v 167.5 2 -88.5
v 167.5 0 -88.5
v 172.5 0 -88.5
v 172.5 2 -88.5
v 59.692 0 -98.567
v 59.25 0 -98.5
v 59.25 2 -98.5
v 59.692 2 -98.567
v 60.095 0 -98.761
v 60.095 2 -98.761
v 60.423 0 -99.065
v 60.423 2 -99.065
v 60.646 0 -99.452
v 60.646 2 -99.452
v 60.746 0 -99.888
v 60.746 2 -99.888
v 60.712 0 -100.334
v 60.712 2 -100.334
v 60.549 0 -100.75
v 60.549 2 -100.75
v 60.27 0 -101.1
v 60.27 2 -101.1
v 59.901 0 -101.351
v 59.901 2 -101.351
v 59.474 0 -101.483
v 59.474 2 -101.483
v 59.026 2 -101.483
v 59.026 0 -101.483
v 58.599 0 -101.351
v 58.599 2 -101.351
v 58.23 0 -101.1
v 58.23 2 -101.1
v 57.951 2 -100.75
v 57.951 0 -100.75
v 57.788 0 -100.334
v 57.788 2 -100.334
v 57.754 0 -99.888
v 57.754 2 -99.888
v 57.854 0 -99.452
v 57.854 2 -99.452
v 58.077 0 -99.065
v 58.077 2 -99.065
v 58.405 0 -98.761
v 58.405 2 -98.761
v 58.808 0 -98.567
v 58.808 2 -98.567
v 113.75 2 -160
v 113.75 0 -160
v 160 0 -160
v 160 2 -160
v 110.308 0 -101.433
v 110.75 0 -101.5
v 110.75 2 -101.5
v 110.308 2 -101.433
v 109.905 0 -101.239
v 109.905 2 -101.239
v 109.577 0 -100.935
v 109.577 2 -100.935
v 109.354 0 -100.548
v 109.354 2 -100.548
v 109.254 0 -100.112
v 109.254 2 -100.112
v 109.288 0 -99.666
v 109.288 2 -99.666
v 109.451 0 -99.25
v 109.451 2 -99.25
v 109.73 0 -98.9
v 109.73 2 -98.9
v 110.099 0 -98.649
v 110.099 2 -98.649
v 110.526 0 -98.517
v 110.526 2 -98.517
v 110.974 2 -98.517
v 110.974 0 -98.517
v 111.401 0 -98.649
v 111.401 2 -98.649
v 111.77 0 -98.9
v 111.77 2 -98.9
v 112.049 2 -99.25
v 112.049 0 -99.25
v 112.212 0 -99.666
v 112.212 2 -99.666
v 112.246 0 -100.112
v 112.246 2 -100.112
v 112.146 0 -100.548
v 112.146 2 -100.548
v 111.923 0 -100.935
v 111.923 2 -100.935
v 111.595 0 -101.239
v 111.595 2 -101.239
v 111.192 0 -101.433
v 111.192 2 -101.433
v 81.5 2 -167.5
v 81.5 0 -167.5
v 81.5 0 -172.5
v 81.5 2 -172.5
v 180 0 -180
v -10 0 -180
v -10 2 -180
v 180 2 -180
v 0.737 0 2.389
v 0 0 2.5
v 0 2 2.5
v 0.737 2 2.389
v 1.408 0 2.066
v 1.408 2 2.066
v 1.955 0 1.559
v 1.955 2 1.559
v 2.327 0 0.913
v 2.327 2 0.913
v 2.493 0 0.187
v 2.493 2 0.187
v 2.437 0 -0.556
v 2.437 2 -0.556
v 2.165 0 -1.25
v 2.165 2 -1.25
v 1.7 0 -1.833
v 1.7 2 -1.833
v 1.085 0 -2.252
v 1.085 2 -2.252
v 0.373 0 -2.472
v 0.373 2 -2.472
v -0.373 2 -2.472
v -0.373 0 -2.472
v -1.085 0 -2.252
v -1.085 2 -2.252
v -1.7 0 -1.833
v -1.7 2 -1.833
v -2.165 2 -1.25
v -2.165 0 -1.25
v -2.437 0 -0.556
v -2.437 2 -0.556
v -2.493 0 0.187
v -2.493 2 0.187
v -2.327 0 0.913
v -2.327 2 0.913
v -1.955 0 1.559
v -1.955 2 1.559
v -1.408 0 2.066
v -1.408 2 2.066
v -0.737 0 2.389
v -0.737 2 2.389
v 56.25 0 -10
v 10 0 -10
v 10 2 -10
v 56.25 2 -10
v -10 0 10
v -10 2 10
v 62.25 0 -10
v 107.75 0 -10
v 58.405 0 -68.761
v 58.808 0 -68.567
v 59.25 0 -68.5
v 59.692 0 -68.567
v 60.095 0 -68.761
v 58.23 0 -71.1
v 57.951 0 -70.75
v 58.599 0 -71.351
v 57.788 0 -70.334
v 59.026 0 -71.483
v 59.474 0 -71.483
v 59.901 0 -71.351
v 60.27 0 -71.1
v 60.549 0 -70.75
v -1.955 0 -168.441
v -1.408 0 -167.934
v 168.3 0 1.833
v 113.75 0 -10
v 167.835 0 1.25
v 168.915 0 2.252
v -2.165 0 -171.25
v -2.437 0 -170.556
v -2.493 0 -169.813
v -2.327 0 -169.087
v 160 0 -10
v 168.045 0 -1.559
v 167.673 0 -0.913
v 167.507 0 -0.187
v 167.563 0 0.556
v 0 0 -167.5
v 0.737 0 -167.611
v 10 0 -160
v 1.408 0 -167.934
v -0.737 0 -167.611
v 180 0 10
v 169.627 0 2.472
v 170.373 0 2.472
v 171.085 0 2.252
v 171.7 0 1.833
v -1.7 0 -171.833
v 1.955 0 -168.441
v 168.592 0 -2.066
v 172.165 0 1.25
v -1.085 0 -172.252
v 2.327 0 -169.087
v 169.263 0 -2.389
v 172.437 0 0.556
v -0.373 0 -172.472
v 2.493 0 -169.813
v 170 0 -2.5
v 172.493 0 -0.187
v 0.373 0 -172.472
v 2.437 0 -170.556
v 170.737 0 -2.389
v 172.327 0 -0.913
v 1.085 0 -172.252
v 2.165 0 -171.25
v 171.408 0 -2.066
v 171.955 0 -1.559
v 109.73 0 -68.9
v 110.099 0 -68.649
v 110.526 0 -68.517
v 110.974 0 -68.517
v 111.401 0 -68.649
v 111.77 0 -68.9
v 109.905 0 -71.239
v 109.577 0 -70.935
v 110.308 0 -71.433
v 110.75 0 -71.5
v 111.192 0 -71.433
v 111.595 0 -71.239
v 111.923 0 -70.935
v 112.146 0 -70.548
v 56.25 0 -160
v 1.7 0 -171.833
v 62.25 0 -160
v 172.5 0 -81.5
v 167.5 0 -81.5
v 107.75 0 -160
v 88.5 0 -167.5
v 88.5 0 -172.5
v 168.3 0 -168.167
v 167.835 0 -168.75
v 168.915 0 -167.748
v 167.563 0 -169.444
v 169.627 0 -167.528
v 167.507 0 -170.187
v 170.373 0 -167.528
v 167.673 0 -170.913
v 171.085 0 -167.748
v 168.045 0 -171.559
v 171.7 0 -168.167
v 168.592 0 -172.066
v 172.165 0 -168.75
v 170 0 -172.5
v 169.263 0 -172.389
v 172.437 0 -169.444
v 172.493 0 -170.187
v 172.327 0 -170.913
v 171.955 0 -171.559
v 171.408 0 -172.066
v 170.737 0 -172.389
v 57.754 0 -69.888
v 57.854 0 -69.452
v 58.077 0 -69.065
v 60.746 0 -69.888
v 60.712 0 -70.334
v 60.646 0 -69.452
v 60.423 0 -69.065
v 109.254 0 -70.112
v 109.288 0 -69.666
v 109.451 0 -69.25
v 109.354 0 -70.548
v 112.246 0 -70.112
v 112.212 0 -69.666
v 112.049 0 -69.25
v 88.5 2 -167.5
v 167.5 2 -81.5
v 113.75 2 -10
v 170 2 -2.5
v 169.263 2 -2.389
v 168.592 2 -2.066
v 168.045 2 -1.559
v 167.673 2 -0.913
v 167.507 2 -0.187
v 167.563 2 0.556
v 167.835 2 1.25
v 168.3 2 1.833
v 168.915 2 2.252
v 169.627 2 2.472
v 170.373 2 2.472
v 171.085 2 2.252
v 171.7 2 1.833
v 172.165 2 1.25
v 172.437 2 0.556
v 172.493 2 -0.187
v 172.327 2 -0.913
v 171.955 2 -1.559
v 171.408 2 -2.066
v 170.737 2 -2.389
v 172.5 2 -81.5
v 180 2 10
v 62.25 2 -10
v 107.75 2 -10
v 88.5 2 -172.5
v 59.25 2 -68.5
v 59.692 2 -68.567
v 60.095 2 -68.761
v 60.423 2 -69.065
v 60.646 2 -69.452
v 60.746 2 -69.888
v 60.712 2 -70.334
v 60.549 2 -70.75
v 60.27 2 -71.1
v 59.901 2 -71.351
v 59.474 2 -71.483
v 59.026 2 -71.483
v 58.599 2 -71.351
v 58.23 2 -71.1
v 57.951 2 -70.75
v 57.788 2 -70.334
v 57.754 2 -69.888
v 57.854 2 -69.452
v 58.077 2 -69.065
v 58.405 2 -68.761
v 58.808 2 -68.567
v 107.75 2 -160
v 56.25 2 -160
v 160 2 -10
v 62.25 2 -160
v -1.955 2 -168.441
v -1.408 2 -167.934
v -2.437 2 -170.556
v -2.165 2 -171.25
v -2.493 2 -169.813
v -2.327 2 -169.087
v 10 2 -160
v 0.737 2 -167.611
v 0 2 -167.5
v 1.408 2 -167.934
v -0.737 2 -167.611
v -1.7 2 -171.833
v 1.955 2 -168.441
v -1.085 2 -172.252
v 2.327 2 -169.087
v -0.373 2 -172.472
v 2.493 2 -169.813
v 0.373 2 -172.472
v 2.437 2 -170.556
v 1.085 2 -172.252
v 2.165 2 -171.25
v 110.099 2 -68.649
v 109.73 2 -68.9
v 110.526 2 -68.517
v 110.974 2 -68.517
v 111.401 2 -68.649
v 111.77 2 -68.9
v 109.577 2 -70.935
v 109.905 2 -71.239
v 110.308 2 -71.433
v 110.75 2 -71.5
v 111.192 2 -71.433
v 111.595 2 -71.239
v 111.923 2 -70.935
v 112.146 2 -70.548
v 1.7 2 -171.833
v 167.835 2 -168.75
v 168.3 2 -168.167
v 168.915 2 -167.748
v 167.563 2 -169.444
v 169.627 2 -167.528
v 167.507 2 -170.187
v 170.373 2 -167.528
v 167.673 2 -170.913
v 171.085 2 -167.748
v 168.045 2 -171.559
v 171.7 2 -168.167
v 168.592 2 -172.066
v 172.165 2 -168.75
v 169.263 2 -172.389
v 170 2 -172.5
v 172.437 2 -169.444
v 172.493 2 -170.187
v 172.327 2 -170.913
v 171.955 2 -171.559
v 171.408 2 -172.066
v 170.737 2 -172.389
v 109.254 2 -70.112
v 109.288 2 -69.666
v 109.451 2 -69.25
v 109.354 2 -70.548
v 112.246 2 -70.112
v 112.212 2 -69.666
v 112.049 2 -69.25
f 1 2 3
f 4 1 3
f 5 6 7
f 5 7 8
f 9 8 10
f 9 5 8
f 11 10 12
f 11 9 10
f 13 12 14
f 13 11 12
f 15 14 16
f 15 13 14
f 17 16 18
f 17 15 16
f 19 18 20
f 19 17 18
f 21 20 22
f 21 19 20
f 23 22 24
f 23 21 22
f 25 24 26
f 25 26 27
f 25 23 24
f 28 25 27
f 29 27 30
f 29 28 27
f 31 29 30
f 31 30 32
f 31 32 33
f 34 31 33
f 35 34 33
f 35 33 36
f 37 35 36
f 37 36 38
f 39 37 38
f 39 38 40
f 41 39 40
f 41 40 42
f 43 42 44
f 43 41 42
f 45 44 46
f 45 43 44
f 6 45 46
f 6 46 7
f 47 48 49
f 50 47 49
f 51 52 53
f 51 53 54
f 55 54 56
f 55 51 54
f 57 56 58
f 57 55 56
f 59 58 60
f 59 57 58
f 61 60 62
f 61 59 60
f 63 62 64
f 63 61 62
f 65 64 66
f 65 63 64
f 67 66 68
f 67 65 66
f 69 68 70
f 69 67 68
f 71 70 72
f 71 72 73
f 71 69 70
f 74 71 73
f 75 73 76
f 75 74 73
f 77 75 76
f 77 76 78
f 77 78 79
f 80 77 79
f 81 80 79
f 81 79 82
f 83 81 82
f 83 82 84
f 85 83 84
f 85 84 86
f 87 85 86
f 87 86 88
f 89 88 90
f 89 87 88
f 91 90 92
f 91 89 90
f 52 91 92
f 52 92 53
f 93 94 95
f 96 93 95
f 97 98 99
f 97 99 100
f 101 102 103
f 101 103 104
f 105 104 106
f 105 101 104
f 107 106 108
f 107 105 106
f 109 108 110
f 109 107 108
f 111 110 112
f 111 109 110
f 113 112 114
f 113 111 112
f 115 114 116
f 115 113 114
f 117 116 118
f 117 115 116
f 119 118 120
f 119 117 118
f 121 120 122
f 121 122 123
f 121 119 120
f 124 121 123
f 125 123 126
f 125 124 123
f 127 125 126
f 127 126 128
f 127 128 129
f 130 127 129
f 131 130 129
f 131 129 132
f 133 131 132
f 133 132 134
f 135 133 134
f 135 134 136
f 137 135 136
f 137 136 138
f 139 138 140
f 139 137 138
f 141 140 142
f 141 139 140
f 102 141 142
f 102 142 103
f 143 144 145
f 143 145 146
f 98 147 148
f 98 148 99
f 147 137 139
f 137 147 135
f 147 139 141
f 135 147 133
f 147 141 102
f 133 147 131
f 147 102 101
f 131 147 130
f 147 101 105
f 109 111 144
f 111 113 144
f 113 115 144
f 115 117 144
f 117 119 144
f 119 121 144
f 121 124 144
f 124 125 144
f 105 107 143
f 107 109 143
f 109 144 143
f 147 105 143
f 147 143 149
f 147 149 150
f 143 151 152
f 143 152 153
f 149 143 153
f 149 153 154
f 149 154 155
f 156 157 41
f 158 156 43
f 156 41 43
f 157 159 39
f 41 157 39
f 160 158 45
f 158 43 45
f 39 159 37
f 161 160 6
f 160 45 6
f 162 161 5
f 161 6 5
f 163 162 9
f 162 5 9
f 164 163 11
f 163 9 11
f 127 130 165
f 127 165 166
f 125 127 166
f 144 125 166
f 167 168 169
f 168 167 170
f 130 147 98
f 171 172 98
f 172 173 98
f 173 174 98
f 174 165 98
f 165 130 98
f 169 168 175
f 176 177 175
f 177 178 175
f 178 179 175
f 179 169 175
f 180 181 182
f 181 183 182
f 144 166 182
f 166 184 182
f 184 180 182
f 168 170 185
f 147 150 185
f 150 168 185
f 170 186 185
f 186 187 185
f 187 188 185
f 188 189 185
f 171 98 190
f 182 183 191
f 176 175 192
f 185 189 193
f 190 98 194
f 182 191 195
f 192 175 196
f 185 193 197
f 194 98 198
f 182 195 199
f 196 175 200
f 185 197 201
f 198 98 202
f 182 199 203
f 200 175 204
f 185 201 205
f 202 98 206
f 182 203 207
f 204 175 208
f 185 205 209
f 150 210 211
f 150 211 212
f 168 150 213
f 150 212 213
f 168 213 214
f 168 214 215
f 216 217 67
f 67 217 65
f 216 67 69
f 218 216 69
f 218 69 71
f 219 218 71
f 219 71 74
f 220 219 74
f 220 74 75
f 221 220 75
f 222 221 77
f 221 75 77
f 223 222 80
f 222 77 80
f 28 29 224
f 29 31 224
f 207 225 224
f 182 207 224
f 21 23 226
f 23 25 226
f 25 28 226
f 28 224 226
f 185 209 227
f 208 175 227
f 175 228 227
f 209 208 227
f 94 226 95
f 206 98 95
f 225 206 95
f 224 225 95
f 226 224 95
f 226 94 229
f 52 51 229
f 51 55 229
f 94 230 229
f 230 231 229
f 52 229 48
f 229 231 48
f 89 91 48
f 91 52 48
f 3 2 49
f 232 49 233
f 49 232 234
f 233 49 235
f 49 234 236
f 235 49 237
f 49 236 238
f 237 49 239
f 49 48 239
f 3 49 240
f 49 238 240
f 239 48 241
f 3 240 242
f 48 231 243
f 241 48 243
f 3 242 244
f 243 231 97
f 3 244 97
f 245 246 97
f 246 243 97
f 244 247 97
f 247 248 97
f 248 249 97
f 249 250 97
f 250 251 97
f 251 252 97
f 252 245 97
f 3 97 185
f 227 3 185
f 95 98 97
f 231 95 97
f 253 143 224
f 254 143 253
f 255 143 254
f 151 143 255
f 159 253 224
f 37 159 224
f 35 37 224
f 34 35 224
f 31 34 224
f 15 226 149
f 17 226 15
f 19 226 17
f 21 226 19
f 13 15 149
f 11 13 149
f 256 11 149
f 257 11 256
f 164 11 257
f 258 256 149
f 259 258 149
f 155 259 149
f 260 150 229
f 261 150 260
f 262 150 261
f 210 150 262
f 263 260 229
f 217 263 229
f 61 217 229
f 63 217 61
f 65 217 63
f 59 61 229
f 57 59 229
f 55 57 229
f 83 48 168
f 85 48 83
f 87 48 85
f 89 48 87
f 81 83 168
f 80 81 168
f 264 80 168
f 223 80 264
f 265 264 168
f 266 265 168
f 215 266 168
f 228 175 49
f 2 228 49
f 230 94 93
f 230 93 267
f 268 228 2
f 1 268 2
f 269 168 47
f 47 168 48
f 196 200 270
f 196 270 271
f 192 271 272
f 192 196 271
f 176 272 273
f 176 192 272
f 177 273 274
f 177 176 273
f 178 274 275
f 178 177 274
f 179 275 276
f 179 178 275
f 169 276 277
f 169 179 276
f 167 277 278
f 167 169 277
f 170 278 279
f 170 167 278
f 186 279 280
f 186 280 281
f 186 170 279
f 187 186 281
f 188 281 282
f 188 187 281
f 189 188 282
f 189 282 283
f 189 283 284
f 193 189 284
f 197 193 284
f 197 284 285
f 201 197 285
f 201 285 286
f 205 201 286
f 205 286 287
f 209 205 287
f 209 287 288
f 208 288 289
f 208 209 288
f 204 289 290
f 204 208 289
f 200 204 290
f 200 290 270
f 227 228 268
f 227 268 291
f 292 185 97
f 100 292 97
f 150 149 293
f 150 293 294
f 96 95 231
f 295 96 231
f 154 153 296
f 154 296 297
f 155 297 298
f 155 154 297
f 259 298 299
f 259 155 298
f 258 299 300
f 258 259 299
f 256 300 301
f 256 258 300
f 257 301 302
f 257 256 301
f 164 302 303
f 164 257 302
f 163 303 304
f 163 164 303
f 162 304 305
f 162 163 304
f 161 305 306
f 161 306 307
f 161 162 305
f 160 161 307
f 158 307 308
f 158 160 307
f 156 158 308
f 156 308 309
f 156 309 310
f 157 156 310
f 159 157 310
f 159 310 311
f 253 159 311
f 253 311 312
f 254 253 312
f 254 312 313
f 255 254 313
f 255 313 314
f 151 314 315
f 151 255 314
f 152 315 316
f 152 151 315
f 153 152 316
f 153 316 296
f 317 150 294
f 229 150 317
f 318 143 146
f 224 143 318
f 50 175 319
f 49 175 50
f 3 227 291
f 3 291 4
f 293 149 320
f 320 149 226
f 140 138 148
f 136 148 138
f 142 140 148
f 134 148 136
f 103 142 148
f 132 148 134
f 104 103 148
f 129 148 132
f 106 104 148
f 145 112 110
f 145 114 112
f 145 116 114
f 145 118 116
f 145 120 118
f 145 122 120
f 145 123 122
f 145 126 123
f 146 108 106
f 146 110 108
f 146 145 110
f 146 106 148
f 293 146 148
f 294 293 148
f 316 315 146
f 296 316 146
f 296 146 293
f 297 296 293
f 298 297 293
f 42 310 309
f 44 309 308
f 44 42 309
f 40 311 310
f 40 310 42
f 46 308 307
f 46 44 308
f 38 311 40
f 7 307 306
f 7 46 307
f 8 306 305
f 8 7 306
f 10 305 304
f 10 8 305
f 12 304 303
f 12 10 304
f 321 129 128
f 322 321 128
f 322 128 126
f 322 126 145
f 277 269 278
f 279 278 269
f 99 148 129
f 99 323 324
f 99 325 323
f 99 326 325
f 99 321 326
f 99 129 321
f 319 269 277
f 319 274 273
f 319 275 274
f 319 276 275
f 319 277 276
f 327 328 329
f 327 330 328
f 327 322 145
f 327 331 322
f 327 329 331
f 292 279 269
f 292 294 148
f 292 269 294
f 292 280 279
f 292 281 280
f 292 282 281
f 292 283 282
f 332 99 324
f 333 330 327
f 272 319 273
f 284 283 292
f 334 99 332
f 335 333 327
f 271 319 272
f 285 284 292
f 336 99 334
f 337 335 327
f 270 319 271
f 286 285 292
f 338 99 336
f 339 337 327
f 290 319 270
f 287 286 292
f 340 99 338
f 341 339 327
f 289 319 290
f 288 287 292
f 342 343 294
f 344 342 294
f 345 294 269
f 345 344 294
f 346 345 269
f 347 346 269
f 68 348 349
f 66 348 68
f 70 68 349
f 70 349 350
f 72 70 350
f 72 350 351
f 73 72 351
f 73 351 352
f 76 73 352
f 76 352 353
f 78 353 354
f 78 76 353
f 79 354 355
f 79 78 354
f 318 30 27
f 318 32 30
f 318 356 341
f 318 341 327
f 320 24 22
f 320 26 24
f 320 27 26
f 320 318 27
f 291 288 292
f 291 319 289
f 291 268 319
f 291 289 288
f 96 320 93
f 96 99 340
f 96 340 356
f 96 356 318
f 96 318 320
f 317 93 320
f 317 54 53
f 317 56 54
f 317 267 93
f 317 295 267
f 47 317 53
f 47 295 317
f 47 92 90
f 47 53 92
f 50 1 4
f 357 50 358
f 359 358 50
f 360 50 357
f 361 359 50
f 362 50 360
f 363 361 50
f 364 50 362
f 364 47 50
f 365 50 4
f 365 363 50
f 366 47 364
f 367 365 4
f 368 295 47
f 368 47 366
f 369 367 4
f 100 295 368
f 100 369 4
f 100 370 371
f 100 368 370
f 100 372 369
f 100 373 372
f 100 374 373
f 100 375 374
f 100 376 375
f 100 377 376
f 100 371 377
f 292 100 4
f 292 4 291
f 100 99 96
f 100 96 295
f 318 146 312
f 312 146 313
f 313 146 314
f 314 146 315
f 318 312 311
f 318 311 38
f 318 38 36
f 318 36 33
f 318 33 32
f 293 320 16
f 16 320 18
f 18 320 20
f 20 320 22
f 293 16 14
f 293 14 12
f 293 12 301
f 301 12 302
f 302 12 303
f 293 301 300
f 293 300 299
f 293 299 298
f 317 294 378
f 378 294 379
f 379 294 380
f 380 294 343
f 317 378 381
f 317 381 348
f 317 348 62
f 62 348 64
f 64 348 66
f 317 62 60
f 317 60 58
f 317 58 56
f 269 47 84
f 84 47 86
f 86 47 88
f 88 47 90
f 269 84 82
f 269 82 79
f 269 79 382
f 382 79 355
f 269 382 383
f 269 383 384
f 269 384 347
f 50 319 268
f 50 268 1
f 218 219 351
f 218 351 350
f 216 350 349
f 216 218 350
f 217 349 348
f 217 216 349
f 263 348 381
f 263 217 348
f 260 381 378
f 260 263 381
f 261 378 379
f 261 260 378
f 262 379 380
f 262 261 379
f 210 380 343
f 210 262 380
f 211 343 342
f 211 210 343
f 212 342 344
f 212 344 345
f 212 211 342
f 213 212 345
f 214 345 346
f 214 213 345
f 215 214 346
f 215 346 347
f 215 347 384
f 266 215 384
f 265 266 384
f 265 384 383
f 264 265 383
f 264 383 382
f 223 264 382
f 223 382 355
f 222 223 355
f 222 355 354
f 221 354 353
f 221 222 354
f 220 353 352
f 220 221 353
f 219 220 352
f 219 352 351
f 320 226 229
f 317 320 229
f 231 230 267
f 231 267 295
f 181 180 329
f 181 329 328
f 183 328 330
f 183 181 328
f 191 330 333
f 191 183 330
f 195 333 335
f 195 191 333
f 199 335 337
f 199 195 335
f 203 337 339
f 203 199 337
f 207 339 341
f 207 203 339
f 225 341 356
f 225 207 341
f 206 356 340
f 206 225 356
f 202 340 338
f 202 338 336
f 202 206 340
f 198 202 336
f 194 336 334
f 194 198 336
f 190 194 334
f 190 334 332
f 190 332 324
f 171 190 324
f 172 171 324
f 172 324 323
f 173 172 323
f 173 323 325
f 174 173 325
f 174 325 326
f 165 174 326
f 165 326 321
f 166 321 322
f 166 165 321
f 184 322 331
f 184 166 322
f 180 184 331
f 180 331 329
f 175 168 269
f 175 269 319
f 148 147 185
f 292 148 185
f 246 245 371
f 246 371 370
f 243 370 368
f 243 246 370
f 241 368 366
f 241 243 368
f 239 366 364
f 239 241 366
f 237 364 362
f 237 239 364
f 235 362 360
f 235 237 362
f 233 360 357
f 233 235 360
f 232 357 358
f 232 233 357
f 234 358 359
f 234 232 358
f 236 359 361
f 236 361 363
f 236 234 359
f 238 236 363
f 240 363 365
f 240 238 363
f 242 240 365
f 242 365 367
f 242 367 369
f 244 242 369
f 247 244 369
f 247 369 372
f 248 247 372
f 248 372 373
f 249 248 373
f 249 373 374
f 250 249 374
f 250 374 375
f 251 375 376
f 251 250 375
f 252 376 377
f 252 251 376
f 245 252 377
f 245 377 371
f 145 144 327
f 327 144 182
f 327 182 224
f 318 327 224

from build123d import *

# Parameters (mm, degrees)
CROQUIS1_W              = 190
CROQUIS1_H              = 190
CROQUIS1_R              = 1.5
CROQUIS1_R_2            = 2.5
CROQUIS1_W_2            = 46.25
CROQUIS1_H_2            = 150
CROQUIS1_W_3            = 45.5
CROQUIS1_W_4            = 5
CROQUIS1_H_3            = 7
CROQUIS1_W_5            = 7
CROQUIS1_H_4            = 5
SALIENTE_EXTRUIR1_DEPTH = 2


with BuildPart() as part:
    # Croquis1 → Saliente-Extruir1 (new body)
    with BuildSketch(Plane(origin=(0, 0, 0), x_dir=(1, 0, 0), z_dir=(0, 1, 0))):
        with Locations((85, 85)):
            Rectangle(CROQUIS1_W, CROQUIS1_H)
        with Locations(Location((59.25, 100, 0), (0, 0, 270))):
            Circle(CROQUIS1_R, mode=Mode.SUBTRACT)
        with Locations(Location((59.25, 70, 0), (0, 0, 270))):
            Circle(CROQUIS1_R, mode=Mode.SUBTRACT)
        with Locations(Location((0, 170, 0), (0, 0, 270))):
            Circle(CROQUIS1_R_2, mode=Mode.SUBTRACT)
        with Locations(Location((0, 0, 0), (0, 0, 270))):
            Circle(CROQUIS1_R_2, mode=Mode.SUBTRACT)
        with Locations(Location((110.75, 100, 0), (0, 0, 90))):
            Circle(CROQUIS1_R, mode=Mode.SUBTRACT)
        with Locations(Location((110.75, 70, 0), (0, 0, 90))):
            Circle(CROQUIS1_R, mode=Mode.SUBTRACT)
        with Locations(Location((170, 0, 0), (0, 0, 90))):
            Circle(CROQUIS1_R_2, mode=Mode.SUBTRACT)
        with Locations(Location((170, 170, 0), (0, 0, 90))):
            Circle(CROQUIS1_R_2, mode=Mode.SUBTRACT)
        with Locations((33.125, 85)):
            Rectangle(CROQUIS1_W_2, CROQUIS1_H_2, mode=Mode.SUBTRACT)
        with Locations((136.875, 85)):
            Rectangle(CROQUIS1_W_2, CROQUIS1_H_2, mode=Mode.SUBTRACT)
        with Locations((85, 85)):
            Rectangle(CROQUIS1_W_3, CROQUIS1_H_2, mode=Mode.SUBTRACT)
        with Locations((170, 85)):
            Rectangle(CROQUIS1_W_4, CROQUIS1_H_3, mode=Mode.SUBTRACT)
        with Locations((85, 170)):
            Rectangle(CROQUIS1_W_5, CROQUIS1_H_4, mode=Mode.SUBTRACT)
    extrude(amount=SALIENTE_EXTRUIR1_DEPTH)


solid = part.part
